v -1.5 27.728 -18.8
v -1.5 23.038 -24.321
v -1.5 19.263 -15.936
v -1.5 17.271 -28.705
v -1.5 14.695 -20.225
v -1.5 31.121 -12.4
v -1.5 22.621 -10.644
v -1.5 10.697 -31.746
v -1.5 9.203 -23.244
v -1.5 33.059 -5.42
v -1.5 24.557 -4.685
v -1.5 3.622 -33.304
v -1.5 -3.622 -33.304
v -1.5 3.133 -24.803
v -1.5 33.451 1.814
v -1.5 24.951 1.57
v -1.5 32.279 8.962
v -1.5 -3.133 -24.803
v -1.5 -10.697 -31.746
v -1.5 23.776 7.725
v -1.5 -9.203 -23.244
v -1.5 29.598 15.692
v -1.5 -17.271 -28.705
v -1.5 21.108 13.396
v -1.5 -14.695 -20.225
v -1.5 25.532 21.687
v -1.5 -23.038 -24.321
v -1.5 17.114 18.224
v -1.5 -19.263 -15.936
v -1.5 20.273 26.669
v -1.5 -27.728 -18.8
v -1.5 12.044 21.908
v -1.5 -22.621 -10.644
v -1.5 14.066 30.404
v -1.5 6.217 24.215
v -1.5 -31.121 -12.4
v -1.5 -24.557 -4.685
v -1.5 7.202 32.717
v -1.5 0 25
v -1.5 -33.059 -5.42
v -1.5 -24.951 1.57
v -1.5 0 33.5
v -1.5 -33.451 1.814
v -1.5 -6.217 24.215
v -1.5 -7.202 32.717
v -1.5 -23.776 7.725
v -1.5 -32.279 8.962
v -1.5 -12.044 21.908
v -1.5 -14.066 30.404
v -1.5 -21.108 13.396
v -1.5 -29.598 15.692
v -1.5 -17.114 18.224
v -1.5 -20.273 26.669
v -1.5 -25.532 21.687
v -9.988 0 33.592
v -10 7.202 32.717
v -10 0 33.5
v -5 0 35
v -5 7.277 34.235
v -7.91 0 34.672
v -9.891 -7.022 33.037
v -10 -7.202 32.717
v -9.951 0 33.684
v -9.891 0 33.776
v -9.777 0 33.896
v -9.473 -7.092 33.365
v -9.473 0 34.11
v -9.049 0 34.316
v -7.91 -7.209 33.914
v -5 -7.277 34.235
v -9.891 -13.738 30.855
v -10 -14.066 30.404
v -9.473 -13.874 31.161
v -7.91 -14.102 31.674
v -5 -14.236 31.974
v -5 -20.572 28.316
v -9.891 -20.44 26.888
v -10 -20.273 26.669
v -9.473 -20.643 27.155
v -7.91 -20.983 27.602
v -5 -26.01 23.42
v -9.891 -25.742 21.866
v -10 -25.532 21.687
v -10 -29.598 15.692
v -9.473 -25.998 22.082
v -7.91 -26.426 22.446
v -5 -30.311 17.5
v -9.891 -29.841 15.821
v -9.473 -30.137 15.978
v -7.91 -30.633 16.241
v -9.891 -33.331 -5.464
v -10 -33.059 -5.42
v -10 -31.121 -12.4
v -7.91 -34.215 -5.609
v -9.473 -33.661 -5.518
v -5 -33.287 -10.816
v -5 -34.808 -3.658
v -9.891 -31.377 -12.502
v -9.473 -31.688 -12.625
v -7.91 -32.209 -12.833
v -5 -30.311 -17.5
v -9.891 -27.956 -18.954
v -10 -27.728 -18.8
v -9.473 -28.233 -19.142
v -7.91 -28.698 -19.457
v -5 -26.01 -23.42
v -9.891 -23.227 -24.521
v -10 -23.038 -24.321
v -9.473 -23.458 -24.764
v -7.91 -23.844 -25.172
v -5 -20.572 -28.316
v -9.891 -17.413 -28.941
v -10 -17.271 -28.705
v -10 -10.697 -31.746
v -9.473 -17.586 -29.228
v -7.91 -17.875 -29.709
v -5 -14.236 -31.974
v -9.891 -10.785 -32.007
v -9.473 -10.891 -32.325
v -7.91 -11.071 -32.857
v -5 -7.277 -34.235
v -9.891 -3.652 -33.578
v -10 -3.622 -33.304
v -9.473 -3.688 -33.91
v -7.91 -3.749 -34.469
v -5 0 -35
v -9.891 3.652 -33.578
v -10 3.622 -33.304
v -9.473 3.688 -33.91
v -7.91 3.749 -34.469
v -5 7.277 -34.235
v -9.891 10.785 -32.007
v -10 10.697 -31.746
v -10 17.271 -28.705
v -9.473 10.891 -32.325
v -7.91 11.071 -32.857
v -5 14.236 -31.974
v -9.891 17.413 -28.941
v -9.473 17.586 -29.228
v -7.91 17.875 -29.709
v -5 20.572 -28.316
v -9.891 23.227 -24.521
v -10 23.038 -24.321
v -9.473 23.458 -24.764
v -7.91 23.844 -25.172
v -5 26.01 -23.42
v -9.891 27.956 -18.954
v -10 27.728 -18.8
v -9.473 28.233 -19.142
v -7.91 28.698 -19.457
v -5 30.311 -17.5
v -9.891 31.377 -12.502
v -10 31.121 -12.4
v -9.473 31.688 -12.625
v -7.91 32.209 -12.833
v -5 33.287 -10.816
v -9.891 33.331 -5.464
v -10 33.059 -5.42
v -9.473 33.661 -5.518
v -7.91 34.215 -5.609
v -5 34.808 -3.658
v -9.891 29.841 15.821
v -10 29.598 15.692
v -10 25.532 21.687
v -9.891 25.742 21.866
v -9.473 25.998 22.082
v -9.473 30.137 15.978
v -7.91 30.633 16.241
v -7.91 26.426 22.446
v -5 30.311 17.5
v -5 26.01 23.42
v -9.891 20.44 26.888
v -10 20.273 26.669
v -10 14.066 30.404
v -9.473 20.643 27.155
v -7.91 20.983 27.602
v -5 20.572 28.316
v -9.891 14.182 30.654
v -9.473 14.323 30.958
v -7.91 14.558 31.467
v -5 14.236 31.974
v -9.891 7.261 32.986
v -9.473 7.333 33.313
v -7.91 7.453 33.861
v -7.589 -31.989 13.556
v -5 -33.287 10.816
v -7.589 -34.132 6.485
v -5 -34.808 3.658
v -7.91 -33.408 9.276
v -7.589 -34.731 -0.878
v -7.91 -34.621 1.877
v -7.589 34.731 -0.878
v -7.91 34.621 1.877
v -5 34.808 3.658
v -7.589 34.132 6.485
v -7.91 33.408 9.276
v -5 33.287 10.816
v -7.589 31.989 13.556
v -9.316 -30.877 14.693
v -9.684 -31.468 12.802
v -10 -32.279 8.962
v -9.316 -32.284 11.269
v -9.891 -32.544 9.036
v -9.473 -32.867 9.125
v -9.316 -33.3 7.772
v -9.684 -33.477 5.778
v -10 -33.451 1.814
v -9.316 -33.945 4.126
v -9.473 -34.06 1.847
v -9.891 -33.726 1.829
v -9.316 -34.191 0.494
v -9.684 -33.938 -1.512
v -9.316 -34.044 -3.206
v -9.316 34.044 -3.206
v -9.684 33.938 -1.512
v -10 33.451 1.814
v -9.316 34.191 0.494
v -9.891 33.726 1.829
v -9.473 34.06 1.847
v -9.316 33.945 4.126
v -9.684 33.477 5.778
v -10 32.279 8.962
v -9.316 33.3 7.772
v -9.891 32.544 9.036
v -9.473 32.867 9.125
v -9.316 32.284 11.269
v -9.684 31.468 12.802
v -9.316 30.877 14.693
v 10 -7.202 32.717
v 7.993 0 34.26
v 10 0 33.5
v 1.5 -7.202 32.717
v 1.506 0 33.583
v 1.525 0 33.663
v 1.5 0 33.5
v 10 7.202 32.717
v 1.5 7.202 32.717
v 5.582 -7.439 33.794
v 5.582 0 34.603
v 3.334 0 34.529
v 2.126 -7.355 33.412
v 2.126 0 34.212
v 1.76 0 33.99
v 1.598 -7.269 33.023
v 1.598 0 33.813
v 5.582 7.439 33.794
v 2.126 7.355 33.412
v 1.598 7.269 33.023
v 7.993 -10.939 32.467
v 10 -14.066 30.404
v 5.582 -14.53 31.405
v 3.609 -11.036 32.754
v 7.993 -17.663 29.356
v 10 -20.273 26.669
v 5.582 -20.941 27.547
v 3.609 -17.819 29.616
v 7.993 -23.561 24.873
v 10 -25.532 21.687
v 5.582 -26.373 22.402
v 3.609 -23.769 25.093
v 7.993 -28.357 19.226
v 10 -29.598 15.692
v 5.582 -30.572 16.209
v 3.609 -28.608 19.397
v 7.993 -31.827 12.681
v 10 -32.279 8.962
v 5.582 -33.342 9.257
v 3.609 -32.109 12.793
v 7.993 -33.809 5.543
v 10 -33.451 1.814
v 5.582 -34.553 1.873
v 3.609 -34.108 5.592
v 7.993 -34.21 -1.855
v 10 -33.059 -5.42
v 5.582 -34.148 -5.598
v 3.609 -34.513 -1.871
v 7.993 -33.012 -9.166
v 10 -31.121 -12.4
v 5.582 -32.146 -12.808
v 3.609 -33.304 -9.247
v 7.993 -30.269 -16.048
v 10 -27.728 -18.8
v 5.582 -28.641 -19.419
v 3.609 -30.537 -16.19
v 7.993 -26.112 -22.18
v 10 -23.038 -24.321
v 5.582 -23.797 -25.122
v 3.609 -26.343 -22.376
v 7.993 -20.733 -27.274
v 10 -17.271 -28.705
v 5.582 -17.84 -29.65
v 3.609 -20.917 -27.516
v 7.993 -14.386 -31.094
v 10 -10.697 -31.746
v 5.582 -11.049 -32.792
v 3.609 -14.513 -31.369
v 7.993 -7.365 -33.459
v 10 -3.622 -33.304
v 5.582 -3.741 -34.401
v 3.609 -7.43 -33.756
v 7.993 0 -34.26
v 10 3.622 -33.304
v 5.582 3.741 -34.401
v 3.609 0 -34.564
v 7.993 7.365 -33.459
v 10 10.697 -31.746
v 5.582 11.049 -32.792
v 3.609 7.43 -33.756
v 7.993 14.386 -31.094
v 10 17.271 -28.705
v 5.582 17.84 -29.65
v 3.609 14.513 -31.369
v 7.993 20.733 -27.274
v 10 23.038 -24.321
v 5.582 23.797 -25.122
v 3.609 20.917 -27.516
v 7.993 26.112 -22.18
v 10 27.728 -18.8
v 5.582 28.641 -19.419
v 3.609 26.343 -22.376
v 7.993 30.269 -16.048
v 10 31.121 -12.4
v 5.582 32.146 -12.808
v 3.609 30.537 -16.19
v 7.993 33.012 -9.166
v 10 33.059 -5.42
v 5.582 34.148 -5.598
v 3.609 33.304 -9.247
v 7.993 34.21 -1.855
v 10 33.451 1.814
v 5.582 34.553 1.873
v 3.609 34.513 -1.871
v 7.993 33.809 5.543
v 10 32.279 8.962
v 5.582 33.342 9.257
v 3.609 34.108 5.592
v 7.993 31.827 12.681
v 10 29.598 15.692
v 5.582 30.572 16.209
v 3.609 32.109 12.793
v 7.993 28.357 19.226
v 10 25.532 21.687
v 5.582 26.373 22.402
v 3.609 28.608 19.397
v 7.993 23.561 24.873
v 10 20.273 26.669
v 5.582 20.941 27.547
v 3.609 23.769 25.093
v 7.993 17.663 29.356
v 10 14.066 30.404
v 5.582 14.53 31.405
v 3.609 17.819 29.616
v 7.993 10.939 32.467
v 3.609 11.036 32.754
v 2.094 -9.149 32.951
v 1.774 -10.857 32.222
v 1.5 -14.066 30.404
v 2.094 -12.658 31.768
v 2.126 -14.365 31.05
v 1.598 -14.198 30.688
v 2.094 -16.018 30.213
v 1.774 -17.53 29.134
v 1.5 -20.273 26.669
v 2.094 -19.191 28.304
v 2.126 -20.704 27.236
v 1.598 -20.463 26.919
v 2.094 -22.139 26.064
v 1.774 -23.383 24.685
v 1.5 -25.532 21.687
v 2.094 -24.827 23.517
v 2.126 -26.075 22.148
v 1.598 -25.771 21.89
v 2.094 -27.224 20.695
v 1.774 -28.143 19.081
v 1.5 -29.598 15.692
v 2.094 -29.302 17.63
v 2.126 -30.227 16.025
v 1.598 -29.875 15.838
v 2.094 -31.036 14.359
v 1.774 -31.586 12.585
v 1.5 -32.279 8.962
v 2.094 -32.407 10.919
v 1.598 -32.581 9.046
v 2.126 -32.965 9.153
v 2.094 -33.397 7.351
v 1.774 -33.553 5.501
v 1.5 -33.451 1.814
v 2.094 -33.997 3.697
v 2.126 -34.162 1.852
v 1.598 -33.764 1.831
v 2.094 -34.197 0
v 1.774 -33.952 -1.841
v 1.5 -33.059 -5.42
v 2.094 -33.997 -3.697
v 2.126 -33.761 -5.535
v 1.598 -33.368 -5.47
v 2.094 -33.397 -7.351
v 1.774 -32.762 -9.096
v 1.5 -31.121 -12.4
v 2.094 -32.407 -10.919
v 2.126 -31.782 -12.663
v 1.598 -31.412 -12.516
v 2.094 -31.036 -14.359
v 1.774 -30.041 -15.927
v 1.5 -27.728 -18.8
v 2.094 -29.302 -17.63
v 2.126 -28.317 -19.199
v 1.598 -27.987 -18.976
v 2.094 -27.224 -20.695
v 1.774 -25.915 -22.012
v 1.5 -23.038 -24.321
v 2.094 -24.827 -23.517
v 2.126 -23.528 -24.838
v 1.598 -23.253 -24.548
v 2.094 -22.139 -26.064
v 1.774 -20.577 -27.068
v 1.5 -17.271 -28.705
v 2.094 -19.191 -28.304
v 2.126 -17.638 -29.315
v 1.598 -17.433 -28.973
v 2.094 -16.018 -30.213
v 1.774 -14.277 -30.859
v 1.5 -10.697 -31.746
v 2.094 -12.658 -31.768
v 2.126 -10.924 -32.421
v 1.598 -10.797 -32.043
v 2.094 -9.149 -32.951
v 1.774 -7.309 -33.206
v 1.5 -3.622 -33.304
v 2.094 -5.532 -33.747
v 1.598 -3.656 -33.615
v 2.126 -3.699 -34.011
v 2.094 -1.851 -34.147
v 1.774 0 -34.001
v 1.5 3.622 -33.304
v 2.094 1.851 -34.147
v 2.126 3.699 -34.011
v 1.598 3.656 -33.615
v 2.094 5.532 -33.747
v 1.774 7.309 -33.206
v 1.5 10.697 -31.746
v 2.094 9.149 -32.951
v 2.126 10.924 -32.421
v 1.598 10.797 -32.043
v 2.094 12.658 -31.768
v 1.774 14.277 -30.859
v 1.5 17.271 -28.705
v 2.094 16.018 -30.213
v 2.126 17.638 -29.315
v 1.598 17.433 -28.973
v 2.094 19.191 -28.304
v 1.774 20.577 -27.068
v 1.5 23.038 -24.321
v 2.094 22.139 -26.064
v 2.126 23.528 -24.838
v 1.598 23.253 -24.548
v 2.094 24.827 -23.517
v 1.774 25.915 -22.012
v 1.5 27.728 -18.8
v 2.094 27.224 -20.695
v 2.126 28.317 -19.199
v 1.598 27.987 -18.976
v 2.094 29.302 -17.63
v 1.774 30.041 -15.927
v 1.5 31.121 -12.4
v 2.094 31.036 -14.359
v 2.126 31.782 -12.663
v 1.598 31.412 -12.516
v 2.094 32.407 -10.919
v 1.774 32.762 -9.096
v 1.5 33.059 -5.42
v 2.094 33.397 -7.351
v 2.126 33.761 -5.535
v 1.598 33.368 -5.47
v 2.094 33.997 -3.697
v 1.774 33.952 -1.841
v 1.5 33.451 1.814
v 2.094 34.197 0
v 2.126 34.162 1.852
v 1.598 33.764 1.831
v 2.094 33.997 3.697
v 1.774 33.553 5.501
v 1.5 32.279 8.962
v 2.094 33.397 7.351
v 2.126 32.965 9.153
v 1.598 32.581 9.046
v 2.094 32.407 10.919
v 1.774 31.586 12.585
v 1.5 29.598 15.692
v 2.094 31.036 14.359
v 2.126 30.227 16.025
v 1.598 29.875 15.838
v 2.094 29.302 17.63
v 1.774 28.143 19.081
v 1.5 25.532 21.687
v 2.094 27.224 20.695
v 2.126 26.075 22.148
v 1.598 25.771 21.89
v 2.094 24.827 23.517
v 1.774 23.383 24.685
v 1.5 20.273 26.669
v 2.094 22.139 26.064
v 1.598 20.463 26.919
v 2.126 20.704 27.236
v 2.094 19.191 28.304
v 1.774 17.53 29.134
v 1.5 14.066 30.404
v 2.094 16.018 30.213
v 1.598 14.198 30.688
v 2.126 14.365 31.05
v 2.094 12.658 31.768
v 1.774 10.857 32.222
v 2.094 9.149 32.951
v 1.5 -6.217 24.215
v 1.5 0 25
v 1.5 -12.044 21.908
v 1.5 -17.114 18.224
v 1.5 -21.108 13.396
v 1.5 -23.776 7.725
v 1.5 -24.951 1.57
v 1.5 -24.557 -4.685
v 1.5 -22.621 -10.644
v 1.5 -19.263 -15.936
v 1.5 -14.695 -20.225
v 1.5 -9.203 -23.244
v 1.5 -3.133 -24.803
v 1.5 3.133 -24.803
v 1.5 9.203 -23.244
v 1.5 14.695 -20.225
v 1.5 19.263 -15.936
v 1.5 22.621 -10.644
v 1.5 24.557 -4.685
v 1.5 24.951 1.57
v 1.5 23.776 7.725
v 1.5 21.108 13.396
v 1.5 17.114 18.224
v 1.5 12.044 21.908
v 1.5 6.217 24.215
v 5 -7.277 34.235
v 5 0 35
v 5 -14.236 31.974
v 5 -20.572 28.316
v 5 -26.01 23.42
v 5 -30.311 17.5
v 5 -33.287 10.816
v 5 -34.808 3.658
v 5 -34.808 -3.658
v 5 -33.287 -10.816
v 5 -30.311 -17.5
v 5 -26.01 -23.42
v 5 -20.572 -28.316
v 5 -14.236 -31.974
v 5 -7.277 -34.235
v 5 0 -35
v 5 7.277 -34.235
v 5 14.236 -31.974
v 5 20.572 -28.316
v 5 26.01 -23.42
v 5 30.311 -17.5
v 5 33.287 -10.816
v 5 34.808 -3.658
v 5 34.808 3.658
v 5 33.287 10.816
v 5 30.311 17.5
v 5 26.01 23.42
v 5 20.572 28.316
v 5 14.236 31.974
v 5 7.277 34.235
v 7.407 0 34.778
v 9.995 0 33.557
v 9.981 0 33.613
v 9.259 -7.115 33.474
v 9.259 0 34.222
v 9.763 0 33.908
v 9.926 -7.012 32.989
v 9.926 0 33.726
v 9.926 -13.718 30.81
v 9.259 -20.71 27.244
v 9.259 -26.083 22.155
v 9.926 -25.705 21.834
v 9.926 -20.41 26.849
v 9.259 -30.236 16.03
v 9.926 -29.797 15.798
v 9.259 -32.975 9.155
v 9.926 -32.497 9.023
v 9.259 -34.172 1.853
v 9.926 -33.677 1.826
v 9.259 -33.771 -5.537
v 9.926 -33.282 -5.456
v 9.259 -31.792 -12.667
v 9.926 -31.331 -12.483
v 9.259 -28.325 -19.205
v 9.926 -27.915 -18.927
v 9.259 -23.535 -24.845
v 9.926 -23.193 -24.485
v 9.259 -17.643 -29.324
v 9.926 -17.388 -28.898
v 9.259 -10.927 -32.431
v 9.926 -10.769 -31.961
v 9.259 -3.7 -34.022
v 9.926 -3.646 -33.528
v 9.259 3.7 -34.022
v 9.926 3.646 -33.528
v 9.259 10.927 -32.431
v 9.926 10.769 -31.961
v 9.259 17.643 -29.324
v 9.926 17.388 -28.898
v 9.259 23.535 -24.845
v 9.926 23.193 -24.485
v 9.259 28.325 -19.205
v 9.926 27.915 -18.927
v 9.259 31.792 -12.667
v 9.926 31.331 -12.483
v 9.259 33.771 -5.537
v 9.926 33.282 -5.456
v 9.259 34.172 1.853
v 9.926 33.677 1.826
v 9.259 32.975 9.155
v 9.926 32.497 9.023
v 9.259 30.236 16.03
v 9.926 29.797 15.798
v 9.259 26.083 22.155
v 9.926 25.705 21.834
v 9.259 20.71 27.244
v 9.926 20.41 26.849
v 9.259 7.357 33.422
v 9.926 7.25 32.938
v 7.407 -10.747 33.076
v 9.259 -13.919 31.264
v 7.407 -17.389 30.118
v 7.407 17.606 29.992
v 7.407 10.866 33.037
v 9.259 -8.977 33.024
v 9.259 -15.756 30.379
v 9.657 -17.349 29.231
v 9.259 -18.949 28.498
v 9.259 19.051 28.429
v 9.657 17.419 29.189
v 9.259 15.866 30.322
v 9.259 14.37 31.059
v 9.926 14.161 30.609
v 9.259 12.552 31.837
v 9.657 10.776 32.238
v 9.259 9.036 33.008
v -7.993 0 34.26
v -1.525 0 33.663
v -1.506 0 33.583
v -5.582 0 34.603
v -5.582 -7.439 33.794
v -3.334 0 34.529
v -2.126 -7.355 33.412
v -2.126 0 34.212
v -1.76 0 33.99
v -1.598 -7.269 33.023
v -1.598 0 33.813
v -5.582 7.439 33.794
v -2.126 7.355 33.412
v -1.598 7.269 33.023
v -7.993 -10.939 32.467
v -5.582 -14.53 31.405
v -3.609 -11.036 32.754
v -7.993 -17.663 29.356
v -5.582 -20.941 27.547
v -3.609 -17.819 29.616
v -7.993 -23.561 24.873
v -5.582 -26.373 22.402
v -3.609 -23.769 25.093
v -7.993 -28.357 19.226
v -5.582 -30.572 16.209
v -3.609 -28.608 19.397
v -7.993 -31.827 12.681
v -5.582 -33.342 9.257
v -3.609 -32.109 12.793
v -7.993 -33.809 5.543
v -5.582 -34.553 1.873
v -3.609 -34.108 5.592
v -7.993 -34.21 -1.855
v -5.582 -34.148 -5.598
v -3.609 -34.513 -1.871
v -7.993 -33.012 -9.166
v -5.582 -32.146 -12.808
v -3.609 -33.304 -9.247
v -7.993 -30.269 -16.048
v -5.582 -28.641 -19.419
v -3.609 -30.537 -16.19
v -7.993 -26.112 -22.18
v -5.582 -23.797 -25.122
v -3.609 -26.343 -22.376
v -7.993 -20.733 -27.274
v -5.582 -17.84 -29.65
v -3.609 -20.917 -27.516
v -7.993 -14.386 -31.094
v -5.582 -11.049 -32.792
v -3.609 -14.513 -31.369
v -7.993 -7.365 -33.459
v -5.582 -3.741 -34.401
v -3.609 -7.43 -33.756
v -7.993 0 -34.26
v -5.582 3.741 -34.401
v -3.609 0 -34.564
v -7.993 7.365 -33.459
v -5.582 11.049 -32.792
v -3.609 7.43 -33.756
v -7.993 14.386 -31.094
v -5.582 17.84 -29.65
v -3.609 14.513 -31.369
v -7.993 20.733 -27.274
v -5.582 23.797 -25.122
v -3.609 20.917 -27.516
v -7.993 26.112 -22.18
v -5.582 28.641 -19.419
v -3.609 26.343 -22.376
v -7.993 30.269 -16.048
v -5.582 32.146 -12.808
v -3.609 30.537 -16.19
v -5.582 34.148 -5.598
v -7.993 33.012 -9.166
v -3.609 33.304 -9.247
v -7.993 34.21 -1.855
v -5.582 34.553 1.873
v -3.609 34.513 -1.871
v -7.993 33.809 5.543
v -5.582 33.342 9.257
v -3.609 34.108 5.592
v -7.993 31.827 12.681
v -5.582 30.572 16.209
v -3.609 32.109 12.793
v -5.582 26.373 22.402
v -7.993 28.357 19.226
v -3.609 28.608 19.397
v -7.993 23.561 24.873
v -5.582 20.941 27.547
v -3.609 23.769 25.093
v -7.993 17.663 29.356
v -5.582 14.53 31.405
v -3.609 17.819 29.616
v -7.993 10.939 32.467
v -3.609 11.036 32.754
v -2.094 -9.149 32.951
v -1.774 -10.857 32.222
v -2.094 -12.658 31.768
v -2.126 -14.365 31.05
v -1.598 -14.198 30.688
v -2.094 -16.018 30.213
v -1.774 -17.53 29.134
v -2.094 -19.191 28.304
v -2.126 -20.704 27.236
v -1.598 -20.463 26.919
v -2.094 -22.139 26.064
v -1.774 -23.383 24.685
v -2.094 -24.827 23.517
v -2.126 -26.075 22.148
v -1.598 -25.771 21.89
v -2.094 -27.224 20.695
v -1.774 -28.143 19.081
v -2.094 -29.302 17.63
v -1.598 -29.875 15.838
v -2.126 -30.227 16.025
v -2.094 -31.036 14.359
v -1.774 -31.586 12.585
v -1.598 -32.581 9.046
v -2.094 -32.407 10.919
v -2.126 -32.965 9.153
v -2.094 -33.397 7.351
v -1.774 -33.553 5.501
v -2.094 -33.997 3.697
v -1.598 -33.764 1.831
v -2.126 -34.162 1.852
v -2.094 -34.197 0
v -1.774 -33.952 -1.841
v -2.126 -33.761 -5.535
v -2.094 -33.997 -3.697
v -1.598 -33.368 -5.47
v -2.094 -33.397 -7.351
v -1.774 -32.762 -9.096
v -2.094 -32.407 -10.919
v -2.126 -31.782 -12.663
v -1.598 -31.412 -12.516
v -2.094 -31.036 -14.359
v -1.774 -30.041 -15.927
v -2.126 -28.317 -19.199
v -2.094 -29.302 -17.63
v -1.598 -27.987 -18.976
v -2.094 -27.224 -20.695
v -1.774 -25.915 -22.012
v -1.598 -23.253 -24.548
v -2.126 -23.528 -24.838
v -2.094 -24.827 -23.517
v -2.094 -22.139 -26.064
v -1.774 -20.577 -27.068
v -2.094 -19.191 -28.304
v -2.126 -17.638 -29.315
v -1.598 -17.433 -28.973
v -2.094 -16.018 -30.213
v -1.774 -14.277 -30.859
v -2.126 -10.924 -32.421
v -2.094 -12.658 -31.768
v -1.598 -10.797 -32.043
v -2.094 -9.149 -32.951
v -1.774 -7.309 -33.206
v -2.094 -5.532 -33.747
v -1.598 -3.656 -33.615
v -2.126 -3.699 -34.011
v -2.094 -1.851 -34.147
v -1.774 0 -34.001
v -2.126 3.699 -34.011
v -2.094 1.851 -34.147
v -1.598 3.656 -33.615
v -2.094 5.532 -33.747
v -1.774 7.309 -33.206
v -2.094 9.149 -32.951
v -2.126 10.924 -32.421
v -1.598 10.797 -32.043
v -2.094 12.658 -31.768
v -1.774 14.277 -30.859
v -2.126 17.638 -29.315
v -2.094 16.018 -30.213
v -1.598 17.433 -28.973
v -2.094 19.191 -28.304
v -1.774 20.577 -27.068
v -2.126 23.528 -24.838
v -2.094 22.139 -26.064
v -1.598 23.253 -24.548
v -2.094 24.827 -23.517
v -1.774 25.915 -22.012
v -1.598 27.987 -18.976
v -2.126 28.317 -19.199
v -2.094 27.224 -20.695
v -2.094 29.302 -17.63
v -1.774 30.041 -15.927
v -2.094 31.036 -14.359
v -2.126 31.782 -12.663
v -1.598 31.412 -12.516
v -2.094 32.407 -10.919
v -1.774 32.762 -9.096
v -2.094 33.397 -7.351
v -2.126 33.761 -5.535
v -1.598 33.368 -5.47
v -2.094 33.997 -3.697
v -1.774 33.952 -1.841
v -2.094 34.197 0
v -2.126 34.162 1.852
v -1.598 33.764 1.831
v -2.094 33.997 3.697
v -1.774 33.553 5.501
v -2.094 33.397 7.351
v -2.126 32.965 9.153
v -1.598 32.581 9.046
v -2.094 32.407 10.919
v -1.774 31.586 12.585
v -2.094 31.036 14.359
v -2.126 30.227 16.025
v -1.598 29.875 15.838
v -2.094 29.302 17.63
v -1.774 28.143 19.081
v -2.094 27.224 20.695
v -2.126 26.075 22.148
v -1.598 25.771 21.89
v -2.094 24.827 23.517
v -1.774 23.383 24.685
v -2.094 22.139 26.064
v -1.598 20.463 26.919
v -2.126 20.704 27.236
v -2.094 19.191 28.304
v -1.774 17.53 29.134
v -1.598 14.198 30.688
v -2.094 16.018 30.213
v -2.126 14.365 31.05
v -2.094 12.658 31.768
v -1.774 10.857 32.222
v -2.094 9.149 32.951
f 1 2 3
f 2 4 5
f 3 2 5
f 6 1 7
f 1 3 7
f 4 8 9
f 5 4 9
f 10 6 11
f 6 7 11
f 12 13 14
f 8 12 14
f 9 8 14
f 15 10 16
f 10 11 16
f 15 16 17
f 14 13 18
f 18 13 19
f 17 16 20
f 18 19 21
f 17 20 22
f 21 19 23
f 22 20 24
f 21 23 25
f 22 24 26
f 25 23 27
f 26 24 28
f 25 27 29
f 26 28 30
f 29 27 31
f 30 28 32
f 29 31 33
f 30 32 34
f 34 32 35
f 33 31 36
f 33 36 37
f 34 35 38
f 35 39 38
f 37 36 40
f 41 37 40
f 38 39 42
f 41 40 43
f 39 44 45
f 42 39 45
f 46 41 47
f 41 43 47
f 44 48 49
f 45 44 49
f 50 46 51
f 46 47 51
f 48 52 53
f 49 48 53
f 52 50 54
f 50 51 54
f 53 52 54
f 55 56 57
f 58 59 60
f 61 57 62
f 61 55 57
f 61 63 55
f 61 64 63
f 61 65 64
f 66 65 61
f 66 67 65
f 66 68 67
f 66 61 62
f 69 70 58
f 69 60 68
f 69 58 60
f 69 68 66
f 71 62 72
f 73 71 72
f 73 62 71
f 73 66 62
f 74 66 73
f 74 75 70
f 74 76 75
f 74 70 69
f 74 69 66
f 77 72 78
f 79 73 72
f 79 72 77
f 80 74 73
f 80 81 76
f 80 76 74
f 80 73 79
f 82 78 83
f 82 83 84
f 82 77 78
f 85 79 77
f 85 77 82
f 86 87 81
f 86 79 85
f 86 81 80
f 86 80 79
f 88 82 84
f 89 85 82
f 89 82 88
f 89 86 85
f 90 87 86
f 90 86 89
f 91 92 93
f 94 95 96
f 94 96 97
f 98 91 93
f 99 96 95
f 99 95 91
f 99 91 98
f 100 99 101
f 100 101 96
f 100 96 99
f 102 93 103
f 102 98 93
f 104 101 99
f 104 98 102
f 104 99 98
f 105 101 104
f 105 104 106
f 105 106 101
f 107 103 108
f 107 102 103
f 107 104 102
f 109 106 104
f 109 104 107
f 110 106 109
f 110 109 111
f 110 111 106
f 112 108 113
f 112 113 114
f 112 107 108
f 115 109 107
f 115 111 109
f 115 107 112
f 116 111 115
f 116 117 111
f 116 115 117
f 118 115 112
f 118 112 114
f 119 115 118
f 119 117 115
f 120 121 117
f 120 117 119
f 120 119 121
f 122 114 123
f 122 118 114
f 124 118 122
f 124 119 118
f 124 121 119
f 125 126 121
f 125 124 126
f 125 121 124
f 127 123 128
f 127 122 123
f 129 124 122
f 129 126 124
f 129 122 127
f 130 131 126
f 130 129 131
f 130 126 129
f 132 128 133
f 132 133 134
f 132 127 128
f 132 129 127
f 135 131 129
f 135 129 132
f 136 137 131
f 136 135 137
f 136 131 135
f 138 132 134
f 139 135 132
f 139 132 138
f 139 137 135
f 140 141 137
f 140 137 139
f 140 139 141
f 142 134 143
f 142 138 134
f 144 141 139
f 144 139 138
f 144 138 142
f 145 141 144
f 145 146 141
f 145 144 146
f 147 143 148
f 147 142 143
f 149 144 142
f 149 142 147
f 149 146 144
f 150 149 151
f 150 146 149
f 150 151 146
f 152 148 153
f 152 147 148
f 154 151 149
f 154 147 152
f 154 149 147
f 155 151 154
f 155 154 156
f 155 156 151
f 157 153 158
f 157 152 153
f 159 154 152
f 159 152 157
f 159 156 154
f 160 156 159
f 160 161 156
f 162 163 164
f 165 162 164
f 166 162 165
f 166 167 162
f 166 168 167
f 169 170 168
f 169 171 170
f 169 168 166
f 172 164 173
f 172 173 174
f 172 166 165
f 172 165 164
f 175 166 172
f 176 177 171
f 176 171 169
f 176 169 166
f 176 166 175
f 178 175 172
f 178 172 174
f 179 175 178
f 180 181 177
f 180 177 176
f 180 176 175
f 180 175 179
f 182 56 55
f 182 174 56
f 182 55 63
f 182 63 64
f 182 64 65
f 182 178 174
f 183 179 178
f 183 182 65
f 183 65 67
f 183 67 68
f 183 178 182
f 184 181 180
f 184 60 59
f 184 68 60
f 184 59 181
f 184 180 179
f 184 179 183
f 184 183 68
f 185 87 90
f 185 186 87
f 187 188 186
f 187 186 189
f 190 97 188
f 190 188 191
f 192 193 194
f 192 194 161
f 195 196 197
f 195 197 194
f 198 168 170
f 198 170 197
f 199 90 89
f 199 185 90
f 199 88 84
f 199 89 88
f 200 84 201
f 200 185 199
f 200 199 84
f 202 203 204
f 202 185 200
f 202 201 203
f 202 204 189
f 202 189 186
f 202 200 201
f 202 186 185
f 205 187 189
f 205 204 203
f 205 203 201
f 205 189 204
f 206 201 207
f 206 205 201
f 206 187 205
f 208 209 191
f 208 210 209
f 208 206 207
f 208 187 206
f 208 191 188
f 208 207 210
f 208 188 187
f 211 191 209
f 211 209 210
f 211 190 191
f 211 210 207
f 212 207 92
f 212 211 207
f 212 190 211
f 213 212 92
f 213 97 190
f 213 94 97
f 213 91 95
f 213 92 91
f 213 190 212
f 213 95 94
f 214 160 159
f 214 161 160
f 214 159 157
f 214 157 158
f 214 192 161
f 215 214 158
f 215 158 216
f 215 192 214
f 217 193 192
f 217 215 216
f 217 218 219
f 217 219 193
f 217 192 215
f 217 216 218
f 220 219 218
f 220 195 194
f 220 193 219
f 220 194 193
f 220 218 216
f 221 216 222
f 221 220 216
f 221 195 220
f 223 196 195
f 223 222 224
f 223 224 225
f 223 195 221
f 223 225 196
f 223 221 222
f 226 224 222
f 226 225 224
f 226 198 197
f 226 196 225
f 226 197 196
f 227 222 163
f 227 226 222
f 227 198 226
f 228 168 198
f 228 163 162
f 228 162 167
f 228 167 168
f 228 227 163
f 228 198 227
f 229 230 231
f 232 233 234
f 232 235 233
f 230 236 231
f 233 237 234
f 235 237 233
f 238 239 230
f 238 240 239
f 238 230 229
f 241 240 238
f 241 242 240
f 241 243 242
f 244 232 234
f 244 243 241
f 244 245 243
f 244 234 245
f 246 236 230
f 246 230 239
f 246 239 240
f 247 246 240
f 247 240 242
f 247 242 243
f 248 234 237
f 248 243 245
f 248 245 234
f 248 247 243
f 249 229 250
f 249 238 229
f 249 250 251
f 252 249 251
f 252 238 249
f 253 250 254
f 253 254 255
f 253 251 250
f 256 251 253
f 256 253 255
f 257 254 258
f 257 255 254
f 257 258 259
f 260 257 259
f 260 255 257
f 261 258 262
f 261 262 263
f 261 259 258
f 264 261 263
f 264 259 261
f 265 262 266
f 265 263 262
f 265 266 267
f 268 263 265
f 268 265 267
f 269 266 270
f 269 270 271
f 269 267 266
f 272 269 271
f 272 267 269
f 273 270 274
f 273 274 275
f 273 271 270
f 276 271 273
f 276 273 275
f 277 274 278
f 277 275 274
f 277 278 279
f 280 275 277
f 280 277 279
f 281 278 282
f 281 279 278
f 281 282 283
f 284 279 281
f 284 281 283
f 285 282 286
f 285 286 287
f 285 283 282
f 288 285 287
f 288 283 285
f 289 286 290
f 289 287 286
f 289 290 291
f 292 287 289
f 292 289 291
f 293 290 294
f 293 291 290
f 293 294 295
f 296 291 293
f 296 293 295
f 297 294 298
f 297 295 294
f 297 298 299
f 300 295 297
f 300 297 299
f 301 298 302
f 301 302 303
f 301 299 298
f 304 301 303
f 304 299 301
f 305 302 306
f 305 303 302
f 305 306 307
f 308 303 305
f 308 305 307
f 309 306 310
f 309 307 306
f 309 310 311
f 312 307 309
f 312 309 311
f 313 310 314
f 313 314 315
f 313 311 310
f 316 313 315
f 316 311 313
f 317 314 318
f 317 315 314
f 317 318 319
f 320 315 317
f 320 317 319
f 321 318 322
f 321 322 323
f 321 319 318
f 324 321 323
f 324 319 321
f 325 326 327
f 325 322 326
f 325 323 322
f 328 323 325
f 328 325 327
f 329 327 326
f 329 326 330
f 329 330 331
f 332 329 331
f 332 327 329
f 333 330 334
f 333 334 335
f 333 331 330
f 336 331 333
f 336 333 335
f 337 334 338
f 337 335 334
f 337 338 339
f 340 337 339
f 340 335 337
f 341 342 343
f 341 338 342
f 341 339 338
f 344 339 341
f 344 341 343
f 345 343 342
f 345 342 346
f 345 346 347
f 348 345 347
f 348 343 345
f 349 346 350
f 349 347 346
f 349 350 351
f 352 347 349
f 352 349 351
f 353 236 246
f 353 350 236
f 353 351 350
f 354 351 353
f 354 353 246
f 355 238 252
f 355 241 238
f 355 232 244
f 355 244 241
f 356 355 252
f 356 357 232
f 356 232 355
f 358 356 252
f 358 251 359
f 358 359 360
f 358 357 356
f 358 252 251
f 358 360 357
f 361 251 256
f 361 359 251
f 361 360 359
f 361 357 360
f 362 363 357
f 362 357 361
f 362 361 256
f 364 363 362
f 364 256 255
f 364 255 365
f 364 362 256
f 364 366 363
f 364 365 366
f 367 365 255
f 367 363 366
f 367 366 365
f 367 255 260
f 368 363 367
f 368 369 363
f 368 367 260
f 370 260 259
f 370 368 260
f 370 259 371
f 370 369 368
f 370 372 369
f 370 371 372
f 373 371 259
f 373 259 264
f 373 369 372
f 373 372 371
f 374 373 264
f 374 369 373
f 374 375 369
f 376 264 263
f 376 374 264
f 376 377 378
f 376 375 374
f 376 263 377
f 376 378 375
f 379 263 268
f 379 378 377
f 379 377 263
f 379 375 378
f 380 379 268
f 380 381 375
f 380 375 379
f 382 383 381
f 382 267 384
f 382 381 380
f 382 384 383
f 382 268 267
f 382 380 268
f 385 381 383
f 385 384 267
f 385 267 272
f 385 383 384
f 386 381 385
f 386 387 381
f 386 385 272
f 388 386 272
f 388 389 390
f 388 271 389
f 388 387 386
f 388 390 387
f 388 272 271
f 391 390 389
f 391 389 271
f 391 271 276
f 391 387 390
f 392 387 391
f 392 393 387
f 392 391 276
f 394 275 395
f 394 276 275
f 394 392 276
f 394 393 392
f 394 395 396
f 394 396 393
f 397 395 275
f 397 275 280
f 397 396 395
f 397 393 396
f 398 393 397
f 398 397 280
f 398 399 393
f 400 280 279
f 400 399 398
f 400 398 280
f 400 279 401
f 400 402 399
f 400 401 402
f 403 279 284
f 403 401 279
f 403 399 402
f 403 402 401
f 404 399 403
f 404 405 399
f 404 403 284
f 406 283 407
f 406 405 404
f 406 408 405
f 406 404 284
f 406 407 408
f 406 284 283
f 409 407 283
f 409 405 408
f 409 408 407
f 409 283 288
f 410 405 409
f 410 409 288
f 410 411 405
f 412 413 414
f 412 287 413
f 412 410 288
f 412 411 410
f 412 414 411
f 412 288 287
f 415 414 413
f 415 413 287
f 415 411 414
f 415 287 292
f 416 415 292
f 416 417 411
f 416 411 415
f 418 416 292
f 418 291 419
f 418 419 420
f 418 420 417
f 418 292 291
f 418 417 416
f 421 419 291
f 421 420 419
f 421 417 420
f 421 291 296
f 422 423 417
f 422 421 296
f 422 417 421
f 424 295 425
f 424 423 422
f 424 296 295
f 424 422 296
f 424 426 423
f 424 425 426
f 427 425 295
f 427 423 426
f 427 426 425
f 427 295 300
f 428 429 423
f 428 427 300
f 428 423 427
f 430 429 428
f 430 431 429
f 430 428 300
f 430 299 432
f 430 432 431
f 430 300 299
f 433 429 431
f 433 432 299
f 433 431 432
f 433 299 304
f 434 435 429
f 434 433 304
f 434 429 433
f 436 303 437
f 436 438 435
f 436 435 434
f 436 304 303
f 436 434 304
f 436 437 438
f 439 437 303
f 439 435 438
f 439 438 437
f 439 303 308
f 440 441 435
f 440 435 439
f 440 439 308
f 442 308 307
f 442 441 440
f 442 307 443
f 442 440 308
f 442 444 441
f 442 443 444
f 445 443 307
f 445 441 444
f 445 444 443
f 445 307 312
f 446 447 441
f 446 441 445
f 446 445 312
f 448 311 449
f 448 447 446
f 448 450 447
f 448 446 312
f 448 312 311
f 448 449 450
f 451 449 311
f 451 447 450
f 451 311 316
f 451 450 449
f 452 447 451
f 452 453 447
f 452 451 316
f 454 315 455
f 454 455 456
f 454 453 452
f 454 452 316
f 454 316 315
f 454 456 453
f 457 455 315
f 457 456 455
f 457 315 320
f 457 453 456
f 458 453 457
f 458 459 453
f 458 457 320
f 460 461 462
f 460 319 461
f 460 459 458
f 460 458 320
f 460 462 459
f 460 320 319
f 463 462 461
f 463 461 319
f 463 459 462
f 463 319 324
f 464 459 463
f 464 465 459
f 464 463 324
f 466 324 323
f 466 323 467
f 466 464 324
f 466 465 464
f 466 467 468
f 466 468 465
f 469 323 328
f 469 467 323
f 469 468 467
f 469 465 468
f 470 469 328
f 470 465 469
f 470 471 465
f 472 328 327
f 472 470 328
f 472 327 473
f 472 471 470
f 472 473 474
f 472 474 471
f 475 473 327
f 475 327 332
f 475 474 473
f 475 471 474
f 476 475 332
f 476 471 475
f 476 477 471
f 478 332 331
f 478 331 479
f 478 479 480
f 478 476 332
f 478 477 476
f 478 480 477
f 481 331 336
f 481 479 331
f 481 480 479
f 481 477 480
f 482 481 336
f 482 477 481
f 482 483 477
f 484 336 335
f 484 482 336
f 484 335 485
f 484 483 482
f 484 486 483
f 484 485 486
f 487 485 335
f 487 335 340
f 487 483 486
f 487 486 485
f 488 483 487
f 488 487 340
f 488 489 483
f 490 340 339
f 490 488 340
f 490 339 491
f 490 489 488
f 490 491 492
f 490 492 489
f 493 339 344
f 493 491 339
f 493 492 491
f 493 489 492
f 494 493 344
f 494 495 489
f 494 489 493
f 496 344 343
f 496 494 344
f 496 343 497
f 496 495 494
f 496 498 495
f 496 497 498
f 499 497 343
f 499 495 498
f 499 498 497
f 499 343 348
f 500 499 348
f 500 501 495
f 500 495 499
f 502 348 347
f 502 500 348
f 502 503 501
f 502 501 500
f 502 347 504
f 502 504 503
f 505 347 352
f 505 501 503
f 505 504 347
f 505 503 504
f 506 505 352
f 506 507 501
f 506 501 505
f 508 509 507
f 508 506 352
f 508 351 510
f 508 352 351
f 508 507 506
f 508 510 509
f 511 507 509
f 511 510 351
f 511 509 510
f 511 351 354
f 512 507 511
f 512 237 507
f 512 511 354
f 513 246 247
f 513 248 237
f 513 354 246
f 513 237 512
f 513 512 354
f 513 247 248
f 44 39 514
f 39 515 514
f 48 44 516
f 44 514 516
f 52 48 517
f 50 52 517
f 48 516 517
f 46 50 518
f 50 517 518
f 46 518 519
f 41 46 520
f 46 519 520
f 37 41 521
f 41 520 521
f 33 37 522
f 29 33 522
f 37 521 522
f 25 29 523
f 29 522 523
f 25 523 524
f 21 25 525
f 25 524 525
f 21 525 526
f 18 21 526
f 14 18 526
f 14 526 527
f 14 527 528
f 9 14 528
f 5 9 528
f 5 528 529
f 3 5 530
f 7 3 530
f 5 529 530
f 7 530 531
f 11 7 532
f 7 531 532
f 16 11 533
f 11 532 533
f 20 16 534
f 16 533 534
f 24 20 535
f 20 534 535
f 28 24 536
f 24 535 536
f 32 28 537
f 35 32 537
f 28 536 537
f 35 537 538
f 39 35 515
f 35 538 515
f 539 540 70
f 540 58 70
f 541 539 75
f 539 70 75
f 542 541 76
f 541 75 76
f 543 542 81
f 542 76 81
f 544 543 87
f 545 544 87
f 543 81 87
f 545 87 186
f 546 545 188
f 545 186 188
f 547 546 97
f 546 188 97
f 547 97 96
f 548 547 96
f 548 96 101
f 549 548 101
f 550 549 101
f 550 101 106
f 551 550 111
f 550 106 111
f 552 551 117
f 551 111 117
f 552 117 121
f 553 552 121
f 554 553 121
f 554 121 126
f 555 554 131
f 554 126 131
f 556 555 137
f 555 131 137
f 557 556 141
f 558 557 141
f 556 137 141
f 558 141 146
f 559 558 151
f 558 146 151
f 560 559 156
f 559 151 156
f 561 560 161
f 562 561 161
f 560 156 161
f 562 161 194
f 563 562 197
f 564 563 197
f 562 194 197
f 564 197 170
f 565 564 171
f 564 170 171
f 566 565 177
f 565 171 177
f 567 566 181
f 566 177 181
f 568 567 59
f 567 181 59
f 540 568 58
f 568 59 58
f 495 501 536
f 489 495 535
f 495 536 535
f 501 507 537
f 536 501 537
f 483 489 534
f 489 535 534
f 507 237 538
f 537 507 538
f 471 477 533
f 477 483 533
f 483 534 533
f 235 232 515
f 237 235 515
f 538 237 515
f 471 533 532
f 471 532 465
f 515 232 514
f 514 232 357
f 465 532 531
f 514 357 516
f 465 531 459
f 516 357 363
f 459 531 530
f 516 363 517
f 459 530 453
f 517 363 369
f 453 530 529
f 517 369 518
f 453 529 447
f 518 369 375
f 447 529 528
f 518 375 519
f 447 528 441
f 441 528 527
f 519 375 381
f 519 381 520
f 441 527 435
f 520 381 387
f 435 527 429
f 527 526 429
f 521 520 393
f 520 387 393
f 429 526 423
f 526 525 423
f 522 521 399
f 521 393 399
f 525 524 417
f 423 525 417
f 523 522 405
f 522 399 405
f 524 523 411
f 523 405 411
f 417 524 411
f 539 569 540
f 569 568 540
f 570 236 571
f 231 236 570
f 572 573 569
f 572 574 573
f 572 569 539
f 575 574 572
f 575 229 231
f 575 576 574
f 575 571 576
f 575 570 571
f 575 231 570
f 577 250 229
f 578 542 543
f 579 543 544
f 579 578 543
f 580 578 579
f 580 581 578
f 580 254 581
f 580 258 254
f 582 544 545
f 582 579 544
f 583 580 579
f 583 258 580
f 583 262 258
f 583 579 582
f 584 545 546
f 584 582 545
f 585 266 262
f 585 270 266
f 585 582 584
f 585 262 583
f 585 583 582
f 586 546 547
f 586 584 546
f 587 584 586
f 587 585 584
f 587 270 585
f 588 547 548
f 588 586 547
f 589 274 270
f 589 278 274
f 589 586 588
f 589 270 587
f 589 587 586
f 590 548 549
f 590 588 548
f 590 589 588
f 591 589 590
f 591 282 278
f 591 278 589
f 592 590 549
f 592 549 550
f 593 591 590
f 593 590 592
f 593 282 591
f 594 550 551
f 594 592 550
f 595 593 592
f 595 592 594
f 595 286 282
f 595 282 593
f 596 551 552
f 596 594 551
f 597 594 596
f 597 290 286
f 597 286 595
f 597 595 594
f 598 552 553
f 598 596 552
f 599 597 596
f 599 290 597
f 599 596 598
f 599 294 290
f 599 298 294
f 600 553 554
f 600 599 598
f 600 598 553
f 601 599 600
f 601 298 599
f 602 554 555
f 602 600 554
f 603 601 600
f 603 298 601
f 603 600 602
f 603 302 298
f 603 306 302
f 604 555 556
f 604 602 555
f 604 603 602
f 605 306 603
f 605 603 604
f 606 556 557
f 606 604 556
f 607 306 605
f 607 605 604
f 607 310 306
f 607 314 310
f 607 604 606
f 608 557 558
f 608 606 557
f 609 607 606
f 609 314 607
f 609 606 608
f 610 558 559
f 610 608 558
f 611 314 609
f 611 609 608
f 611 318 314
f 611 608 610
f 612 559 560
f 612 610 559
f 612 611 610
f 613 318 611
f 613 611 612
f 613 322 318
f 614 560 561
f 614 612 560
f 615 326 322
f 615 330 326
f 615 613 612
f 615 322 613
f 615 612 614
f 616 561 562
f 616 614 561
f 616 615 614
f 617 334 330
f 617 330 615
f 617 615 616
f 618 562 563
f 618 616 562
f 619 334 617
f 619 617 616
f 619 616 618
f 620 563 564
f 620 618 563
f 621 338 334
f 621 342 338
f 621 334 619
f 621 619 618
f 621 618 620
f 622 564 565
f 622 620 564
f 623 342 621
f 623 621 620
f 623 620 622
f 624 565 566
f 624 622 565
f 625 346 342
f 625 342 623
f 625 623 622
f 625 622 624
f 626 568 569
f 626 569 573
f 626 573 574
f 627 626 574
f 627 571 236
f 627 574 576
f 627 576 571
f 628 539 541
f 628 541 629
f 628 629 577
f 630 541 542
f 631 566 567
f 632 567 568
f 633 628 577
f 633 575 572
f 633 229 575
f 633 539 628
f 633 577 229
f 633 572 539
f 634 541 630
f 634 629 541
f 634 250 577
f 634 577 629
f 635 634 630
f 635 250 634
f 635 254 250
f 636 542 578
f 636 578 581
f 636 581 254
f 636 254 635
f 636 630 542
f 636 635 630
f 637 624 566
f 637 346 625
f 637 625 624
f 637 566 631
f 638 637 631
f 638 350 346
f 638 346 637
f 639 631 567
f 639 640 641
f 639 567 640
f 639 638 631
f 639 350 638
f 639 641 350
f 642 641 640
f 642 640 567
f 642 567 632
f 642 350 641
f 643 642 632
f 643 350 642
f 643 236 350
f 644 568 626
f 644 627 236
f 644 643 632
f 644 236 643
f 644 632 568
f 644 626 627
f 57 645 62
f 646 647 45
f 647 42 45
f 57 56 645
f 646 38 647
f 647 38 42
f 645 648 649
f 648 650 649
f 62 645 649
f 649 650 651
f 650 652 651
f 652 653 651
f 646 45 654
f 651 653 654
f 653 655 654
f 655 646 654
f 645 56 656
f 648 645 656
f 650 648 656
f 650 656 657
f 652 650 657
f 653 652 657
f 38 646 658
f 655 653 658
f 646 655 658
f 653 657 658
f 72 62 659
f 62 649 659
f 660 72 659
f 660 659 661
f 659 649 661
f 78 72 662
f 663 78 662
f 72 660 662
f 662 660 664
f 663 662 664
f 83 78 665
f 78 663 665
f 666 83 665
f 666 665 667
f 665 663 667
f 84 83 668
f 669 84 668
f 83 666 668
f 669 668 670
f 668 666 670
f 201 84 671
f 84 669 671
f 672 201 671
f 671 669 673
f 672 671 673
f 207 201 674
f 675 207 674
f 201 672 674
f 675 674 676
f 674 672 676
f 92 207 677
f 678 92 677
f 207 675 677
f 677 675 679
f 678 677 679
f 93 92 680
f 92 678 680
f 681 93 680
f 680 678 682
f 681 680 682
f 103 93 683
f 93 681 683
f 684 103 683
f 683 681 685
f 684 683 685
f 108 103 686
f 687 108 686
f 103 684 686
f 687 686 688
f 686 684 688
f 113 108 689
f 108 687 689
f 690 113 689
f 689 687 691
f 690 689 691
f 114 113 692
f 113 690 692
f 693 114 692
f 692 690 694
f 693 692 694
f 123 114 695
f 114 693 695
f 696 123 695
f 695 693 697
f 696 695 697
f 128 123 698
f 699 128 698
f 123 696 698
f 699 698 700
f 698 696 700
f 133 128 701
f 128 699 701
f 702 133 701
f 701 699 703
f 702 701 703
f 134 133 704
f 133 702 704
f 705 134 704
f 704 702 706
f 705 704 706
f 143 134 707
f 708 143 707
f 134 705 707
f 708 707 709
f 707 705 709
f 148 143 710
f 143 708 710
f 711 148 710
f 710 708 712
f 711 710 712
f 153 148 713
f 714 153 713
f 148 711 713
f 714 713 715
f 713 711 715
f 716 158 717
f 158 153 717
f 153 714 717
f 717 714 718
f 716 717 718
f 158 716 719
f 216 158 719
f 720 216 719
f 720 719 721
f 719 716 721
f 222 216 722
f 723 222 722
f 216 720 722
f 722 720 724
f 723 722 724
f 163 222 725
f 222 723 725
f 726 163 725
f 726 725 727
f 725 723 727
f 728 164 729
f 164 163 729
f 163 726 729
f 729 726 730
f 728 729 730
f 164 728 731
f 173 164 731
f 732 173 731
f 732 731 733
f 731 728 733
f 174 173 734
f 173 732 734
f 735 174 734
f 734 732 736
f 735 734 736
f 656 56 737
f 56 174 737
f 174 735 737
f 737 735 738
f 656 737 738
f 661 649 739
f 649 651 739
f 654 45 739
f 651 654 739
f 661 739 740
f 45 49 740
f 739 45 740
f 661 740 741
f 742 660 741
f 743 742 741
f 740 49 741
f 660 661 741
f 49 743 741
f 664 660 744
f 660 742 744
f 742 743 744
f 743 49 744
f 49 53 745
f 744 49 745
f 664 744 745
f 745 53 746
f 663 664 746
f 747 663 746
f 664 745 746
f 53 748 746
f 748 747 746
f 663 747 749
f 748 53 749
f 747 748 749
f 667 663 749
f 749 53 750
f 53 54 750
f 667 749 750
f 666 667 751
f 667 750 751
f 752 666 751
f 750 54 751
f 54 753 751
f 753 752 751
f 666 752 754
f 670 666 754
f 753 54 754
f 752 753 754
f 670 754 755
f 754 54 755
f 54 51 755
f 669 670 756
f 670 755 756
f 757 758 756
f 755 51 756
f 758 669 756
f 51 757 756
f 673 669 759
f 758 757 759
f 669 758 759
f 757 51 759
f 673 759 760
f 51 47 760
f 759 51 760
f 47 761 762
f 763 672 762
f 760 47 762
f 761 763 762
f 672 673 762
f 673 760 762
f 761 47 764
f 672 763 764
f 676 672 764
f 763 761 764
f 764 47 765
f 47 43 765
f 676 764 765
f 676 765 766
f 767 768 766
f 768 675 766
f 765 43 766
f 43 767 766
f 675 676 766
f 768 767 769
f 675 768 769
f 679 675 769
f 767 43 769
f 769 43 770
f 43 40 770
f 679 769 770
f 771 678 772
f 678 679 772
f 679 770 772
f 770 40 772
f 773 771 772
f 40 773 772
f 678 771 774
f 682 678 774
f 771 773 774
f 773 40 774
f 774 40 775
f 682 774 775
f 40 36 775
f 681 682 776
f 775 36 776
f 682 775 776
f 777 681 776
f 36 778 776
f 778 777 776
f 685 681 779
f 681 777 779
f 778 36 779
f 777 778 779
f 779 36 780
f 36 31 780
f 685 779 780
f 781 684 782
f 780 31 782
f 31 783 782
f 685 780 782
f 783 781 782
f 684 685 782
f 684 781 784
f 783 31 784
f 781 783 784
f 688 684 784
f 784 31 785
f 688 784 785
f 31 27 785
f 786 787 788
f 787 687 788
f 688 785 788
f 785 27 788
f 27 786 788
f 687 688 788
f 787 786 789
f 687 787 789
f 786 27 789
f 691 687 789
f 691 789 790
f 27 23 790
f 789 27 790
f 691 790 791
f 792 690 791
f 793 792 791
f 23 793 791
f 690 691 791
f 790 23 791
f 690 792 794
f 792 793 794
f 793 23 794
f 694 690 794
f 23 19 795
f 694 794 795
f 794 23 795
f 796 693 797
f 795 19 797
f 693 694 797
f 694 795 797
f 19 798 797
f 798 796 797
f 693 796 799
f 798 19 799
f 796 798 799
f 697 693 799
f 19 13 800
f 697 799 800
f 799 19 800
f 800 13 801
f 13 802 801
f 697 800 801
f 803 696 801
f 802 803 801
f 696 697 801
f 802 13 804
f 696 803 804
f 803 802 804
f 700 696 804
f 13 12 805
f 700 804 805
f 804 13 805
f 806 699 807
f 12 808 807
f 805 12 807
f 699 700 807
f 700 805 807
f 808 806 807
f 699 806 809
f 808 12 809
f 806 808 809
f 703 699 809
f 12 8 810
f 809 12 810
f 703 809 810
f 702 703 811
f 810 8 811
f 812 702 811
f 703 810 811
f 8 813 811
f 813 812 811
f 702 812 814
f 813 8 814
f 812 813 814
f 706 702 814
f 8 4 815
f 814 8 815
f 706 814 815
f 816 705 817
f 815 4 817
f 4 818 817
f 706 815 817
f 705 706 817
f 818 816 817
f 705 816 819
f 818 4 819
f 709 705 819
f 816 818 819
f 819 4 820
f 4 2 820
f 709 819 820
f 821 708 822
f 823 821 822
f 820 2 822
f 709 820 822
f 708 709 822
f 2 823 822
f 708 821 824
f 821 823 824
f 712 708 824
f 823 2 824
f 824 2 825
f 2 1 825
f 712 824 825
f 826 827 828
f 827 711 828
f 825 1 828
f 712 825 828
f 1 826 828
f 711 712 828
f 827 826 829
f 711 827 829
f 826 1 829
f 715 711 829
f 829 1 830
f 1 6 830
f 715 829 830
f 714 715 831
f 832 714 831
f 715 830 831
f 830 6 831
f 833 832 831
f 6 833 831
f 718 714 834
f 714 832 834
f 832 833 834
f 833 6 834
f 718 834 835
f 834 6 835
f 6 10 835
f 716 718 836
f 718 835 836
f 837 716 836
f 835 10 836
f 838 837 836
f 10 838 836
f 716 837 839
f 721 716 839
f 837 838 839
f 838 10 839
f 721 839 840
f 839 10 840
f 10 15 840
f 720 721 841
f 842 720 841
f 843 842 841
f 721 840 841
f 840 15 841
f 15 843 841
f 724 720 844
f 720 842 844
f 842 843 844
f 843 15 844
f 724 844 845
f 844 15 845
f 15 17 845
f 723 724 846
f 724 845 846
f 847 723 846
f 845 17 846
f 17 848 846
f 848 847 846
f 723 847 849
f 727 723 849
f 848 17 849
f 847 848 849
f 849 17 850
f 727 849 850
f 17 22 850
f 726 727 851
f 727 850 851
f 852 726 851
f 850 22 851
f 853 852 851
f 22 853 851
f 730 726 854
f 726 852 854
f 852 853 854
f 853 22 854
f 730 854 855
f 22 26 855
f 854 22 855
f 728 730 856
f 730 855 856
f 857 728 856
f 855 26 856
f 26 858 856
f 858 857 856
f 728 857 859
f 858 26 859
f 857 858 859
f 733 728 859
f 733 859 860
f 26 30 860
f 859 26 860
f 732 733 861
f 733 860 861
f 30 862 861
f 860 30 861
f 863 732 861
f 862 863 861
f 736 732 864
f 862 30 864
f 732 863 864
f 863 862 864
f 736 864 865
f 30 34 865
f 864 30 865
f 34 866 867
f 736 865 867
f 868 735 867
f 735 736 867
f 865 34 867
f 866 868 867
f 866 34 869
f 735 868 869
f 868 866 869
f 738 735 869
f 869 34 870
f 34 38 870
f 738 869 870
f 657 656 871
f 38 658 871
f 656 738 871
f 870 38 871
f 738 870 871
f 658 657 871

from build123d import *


with BuildPart() as f1:
    # F0 (on Front) → F1 (revolve)
    with BuildSketch(Plane.XZ):
        with BuildLine():
            Line((5, 35), (-5, 35))
            add(Edge.make_bspline(
                [(-10, 33.5), (-10, 34.25), (-7.5, 35), (-5, 35)],
                knots=[0, 0, 0, 0, 5.220153, 5.220153, 5.220153, 5.220153], degree=3))
            add(Edge.make_bspline(
                [(-10, 33.5), (-7.5, 35), (-1.5, 35), (-1.5, 33.5)],
                knots=[0, 0, 0, 0, 8.5, 8.5, 8.5, 8.5], degree=3))
            Line((-1.5, 33.5), (-1.5, 25))
            Line((-1.5, 25), (0, 25))
            Line((0, 25), (1.5, 25))
            Line((1.5, 25), (1.5, 33.5))
            add(Edge.make_bspline(
                [(10, 33.5), (7.5, 35), (1.5, 35), (1.5, 33.5)],
                knots=[0, 0, 0, 0, 8.5, 8.5, 8.5, 8.5], degree=3))
            add(Edge.make_bspline(
                [(5, 35), (7.5, 35), (10, 34.25), (10, 33.5)],
                knots=[0, 0, 0, 0, 5.220153, 5.220153, 5.220153, 5.220153], degree=3))
        make_face()
    revolve(axis=Axis((0, 0, 0), (1, 0, 0)))


solid = f1.part
